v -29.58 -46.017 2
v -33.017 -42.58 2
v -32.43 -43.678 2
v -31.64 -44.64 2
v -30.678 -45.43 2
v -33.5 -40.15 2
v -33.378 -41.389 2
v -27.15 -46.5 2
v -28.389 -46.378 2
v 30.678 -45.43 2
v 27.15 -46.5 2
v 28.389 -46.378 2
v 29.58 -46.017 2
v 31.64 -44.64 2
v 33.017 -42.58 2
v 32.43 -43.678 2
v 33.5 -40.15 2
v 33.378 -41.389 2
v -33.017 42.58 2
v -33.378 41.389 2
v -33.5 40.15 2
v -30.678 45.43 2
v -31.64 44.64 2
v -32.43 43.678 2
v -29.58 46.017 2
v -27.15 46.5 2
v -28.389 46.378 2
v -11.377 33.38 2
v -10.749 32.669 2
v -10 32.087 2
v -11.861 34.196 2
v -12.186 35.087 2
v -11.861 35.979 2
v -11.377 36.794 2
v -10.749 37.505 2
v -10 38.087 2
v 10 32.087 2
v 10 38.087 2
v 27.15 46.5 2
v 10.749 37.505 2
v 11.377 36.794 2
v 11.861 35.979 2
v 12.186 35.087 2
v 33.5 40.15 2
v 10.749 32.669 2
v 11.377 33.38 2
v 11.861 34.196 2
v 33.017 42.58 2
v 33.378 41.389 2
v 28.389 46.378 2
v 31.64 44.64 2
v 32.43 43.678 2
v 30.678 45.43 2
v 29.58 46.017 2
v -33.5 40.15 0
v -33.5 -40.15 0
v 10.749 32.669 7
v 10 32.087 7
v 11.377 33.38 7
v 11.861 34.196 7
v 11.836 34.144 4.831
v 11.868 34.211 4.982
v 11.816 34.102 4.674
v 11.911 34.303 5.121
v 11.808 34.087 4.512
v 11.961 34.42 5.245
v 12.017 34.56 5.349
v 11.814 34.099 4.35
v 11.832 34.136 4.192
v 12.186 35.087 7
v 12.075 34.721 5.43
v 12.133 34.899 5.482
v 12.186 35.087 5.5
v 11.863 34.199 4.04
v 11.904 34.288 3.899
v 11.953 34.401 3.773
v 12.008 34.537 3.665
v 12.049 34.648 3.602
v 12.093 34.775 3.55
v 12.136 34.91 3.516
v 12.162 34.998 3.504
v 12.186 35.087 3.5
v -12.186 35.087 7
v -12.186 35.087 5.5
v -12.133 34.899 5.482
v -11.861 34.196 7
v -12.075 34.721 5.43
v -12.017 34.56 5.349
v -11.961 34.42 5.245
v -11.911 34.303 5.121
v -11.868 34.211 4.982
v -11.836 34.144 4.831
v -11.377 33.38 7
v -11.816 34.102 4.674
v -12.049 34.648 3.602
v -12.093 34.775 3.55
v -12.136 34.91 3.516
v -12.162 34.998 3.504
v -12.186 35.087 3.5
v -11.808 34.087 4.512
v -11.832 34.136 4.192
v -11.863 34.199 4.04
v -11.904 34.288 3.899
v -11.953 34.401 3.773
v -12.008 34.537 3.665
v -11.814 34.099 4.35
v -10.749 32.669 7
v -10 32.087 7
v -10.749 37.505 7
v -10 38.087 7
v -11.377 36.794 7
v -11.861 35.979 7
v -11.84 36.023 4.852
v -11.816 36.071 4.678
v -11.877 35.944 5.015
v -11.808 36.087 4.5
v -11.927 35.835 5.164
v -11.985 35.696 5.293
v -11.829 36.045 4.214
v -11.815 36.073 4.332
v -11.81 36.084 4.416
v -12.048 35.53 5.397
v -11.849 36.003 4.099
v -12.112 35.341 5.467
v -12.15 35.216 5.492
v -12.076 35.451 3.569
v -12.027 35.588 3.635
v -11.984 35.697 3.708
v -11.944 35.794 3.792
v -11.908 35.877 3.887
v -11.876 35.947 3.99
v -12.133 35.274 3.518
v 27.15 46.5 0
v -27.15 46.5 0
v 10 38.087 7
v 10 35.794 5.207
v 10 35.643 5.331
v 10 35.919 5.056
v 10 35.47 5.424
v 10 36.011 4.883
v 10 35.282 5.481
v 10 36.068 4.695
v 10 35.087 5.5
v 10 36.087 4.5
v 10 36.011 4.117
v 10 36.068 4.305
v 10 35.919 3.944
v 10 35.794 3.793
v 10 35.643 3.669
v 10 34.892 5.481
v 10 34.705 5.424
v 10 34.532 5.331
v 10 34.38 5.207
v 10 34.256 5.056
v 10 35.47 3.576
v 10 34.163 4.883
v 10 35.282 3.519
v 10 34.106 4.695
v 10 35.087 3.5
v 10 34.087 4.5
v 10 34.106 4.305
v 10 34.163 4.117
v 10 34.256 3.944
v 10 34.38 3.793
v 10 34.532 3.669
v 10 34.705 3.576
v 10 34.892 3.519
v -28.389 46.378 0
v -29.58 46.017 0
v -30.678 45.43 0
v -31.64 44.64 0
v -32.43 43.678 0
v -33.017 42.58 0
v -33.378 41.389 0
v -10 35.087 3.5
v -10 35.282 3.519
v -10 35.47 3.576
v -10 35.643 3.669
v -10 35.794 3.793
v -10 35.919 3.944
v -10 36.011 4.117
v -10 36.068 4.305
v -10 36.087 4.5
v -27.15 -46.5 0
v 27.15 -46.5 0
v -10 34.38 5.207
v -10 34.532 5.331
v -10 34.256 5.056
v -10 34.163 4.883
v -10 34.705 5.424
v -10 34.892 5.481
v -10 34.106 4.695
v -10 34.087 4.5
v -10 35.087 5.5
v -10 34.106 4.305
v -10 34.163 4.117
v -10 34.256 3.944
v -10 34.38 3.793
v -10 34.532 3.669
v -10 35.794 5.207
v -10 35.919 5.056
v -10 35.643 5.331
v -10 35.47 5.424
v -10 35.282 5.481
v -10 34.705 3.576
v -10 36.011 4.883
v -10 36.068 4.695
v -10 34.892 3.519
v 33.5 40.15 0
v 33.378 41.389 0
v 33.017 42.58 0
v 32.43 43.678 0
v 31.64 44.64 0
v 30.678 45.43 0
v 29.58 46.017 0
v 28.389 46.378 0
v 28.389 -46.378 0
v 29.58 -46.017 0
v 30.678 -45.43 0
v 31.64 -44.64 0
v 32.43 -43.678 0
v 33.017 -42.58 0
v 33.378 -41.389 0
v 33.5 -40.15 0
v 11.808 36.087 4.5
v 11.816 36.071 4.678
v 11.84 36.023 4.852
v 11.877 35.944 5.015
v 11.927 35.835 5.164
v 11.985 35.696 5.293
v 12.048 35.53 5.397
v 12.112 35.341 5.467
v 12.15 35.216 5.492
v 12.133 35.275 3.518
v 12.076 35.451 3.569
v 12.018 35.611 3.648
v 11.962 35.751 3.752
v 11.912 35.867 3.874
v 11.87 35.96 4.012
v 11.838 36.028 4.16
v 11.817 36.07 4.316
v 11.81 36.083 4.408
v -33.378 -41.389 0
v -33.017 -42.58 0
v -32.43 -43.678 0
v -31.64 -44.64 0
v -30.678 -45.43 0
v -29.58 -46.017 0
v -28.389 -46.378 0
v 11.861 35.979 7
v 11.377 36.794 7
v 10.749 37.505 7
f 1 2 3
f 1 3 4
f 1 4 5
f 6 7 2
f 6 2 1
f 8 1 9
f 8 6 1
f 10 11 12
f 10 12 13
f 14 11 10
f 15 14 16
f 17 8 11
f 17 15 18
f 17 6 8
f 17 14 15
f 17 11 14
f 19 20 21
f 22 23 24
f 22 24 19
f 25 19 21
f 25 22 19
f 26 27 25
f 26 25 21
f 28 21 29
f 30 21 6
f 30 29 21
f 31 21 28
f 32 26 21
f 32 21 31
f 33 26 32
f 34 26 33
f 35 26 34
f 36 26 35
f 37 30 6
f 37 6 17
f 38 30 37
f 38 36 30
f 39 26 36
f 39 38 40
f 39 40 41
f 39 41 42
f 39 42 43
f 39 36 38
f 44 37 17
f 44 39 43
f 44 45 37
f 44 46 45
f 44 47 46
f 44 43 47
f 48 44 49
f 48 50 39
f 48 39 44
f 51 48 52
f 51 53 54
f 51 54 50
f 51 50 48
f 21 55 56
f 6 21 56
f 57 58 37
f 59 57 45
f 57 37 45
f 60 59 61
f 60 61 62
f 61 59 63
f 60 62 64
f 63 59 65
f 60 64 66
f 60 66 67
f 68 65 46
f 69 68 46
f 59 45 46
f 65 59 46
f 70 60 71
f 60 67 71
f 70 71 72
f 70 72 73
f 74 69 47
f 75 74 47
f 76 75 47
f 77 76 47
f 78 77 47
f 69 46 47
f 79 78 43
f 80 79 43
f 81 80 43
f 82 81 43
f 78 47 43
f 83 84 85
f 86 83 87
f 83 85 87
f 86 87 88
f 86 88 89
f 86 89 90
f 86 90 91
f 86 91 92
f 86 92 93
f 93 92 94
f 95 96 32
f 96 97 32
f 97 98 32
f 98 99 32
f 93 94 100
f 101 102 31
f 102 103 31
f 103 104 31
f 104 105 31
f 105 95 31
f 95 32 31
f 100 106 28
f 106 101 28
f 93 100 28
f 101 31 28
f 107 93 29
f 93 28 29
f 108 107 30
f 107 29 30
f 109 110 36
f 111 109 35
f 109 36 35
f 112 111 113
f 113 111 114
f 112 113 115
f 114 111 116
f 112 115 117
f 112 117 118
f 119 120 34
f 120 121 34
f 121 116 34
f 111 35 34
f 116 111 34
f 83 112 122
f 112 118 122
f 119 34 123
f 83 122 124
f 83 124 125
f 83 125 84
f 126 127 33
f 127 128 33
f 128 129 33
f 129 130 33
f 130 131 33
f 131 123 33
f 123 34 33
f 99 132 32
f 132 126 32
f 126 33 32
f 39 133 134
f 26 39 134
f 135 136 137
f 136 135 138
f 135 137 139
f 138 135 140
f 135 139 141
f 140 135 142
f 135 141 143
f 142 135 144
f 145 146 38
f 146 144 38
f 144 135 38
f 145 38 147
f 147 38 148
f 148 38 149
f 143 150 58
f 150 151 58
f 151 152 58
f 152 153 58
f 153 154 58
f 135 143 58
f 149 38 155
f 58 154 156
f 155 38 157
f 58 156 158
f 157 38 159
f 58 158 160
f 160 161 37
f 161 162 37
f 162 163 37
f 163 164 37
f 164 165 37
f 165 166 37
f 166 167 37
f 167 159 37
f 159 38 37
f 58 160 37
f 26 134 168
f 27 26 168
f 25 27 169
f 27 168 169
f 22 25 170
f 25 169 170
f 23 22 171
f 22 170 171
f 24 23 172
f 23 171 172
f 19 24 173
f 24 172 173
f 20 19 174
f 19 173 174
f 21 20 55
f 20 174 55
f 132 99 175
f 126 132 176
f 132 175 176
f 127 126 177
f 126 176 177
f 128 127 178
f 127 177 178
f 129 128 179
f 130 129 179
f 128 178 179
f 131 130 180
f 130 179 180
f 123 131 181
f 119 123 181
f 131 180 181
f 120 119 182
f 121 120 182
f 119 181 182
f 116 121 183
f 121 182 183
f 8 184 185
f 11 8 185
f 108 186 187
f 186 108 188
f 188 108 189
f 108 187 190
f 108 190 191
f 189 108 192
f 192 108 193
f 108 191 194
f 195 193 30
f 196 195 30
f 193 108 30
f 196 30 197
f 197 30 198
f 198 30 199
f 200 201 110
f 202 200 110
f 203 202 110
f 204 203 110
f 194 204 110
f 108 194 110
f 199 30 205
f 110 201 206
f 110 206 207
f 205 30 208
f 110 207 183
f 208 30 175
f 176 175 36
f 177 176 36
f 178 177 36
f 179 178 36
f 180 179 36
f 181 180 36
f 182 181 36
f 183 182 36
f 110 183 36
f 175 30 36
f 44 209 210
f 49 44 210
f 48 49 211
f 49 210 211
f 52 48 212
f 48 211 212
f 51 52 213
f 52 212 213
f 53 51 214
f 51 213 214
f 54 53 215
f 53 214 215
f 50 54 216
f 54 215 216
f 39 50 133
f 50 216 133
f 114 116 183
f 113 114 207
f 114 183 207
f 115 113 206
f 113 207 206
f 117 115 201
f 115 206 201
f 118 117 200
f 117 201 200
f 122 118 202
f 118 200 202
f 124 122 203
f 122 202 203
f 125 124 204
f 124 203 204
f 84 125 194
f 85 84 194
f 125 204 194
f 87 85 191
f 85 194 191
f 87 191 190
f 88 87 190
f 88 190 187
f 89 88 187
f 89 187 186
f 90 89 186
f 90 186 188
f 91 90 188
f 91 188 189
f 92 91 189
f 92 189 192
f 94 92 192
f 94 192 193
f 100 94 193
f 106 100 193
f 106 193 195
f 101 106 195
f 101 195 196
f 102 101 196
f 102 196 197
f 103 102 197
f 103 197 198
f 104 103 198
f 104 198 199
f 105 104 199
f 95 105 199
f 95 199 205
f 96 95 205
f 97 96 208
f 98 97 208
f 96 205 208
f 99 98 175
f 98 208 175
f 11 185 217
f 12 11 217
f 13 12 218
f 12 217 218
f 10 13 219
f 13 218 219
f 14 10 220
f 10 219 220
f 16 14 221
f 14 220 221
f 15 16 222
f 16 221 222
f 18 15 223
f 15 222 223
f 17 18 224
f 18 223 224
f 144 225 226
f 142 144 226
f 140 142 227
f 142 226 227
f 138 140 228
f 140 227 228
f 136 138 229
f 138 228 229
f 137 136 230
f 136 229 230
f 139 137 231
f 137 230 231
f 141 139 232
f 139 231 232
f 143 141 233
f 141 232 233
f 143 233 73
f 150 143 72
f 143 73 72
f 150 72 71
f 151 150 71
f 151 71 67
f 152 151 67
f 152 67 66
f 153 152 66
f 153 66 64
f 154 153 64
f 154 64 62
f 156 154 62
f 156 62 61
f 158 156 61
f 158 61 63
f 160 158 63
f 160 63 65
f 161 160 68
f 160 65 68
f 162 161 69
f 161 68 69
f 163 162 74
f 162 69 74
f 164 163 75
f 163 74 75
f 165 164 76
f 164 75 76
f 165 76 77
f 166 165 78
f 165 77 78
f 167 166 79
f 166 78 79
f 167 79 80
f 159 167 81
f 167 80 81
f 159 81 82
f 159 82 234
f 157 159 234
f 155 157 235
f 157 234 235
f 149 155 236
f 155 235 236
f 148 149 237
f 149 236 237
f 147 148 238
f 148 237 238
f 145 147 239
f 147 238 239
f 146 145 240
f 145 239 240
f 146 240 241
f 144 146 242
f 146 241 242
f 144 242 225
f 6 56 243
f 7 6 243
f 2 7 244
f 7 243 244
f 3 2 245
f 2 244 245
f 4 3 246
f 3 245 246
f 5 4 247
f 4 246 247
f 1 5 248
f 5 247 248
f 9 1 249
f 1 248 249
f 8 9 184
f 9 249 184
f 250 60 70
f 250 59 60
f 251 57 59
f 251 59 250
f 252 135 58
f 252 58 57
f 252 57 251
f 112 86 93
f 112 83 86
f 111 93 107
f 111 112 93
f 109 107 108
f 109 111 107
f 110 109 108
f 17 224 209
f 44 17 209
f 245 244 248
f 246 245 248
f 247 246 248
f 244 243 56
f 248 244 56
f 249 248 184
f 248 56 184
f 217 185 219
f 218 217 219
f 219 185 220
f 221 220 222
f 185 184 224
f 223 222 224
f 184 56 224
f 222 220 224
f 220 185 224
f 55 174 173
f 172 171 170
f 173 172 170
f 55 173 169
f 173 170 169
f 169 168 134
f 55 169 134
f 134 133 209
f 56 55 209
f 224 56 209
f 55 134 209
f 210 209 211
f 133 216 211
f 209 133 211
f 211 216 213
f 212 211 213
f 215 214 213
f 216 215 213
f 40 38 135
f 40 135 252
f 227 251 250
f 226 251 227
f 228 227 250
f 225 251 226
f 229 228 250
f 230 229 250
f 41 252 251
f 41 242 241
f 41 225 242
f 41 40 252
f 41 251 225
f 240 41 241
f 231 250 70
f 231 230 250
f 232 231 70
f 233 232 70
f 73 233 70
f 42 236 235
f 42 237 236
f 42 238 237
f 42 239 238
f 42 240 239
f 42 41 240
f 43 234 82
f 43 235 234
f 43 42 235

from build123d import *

# Parameters (mm, degrees)
F1_DEPTH    = 2
F3_DEPTH    = 5
F6_DEPTH    = 25.4
F7_T1_DEPTH = 15.711756993


# Not quite as in the source:
# - a fillet or chamfer that OpenCascade refuses, or shapes differently, is made with other operations: its cross-section is extruded or revolved along the edge and cut away or added


with BuildPart() as f1:
    # F0 (on Top) → F1 (new body)
    with BuildSketch(Plane.XY):
        with BuildLine():
            Line((27.15, 46.5), (-27.15, 46.5))
            ThreePointArc((-27.15, 46.5), (-31.6401280605, 44.6401280605), (-33.5, 40.15))
            Line((-33.5, 40.15), (-33.5, -40.15))
            ThreePointArc((-33.5, -40.15), (-31.6401280605, -44.6401280605), (-27.15, -46.5))
            Line((-27.15, -46.5), (27.15, -46.5))
            ThreePointArc((27.15, -46.5), (31.6401280605, -44.6401280605), (33.5, -40.15))
            Line((33.5, -40.15), (33.5, 40.15))
            ThreePointArc((33.5, 40.15), (31.6401280605, 44.6401280605), (27.15, 46.5))
        make_face()
    extrude(amount=F1_DEPTH)

    # F2 (on face) → F3 (join)
    with BuildSketch(Plane.XY.offset(2)):
        Polygon((-11.4712007344, 35.0872650743), (-10, 35.0872650743), (-10, 38.0872650743), (-12.3509485275, 38.0872650743), (-12.3509485275, 35.0872650743), align=None)
        Polygon((-10, 32.0872650743), (-10, 35.0872650743), (-11.4712007344, 35.0872650743), (-12.3509485275, 35.0872650743), (-12.3509485275, 32.0872650743), align=None)
        Polygon((10, 38.0872650743), (10, 35.0872650743), (10, 32.0872650743), (12.3509485275, 32.0872650743), (12.3509485275, 35.0872650743), (12.3509485275, 38.0872650743), align=None)
    extrude(amount=F3_DEPTH)

    # F5 (on face) + F4 (on face) → F6 (cut)
    with BuildSketch(Plane.YZ.offset(12.3509485275)):
        with BuildLine():
            ThreePointArc((36.0872650743, 4.5), (34.3801582931, 5.2071067812), (35.0872650743, 3.5))
            ThreePointArc((35.0872650743, 3.5), (35.7943718554, 3.7928932188), (36.0872650743, 4.5))
        make_face()
    with BuildSketch(Plane(origin=(-12.3509485275, 0, 0), x_dir=(0, -1, 0), z_dir=(-1, 0, 0))):
        with BuildLine():
            ThreePointArc((-34.0872650743, 4.5), (-35.7943718554, 5.2071067812), (-35.0872650743, 3.5))
            ThreePointArc((-35.0872650743, 3.5), (-34.3801582931, 3.7928932188), (-34.0872650743, 4.5))
        make_face()
    extrude(amount=-F6_DEPTH, dir=(1, 0, 0), mode=Mode.SUBTRACT)

    # F7: fillet of radius 5.08 on 4 edges, made by hand

    # F7_s2 → F7_t1 (cut)
    with BuildSketch(Plane.XY.offset(2)):
        with BuildLine():
            ThreePointArc((-12.3509485275, 36.3719678714), (-11.7245976762, 33.9283211581), (-10, 32.0872650743))
            Line((-10, 32.0872650743), (-12.3509485275, 32.0872650743))
            Line((-12.3509485275, 32.0872650743), (-12.3509485275, 36.3719678714))
        make_face()
        with BuildLine():
            ThreePointArc((-10, 38.0872650743), (-11.7245976762, 36.2462089904), (-12.3509485275, 33.8025622771))
            Line((-12.3509485275, 33.8025622771), (-12.3509485275, 38.0872650743))
            Line((-12.3509485275, 38.0872650743), (-10, 38.0872650743))
        make_face()
        with BuildLine():
            ThreePointArc((10, 32.0872650743), (11.7245976762, 33.9283211581), (12.3509485275, 36.3719678714))
            Line((12.3509485275, 36.3719678714), (12.3509485275, 32.0872650743))
            Line((12.3509485275, 32.0872650743), (10, 32.0872650743))
        make_face()
        with BuildLine():
            ThreePointArc((10, 38.0872650743), (11.7245976762, 36.2462089904), (12.3509485275, 33.8025622771))
            Line((12.3509485275, 33.8025622771), (12.3509485275, 38.0872650743))
            Line((12.3509485275, 38.0872650743), (10, 38.0872650743))
        make_face()
    extrude(amount=F7_T1_DEPTH, mode=Mode.SUBTRACT)


solid = f1.part
